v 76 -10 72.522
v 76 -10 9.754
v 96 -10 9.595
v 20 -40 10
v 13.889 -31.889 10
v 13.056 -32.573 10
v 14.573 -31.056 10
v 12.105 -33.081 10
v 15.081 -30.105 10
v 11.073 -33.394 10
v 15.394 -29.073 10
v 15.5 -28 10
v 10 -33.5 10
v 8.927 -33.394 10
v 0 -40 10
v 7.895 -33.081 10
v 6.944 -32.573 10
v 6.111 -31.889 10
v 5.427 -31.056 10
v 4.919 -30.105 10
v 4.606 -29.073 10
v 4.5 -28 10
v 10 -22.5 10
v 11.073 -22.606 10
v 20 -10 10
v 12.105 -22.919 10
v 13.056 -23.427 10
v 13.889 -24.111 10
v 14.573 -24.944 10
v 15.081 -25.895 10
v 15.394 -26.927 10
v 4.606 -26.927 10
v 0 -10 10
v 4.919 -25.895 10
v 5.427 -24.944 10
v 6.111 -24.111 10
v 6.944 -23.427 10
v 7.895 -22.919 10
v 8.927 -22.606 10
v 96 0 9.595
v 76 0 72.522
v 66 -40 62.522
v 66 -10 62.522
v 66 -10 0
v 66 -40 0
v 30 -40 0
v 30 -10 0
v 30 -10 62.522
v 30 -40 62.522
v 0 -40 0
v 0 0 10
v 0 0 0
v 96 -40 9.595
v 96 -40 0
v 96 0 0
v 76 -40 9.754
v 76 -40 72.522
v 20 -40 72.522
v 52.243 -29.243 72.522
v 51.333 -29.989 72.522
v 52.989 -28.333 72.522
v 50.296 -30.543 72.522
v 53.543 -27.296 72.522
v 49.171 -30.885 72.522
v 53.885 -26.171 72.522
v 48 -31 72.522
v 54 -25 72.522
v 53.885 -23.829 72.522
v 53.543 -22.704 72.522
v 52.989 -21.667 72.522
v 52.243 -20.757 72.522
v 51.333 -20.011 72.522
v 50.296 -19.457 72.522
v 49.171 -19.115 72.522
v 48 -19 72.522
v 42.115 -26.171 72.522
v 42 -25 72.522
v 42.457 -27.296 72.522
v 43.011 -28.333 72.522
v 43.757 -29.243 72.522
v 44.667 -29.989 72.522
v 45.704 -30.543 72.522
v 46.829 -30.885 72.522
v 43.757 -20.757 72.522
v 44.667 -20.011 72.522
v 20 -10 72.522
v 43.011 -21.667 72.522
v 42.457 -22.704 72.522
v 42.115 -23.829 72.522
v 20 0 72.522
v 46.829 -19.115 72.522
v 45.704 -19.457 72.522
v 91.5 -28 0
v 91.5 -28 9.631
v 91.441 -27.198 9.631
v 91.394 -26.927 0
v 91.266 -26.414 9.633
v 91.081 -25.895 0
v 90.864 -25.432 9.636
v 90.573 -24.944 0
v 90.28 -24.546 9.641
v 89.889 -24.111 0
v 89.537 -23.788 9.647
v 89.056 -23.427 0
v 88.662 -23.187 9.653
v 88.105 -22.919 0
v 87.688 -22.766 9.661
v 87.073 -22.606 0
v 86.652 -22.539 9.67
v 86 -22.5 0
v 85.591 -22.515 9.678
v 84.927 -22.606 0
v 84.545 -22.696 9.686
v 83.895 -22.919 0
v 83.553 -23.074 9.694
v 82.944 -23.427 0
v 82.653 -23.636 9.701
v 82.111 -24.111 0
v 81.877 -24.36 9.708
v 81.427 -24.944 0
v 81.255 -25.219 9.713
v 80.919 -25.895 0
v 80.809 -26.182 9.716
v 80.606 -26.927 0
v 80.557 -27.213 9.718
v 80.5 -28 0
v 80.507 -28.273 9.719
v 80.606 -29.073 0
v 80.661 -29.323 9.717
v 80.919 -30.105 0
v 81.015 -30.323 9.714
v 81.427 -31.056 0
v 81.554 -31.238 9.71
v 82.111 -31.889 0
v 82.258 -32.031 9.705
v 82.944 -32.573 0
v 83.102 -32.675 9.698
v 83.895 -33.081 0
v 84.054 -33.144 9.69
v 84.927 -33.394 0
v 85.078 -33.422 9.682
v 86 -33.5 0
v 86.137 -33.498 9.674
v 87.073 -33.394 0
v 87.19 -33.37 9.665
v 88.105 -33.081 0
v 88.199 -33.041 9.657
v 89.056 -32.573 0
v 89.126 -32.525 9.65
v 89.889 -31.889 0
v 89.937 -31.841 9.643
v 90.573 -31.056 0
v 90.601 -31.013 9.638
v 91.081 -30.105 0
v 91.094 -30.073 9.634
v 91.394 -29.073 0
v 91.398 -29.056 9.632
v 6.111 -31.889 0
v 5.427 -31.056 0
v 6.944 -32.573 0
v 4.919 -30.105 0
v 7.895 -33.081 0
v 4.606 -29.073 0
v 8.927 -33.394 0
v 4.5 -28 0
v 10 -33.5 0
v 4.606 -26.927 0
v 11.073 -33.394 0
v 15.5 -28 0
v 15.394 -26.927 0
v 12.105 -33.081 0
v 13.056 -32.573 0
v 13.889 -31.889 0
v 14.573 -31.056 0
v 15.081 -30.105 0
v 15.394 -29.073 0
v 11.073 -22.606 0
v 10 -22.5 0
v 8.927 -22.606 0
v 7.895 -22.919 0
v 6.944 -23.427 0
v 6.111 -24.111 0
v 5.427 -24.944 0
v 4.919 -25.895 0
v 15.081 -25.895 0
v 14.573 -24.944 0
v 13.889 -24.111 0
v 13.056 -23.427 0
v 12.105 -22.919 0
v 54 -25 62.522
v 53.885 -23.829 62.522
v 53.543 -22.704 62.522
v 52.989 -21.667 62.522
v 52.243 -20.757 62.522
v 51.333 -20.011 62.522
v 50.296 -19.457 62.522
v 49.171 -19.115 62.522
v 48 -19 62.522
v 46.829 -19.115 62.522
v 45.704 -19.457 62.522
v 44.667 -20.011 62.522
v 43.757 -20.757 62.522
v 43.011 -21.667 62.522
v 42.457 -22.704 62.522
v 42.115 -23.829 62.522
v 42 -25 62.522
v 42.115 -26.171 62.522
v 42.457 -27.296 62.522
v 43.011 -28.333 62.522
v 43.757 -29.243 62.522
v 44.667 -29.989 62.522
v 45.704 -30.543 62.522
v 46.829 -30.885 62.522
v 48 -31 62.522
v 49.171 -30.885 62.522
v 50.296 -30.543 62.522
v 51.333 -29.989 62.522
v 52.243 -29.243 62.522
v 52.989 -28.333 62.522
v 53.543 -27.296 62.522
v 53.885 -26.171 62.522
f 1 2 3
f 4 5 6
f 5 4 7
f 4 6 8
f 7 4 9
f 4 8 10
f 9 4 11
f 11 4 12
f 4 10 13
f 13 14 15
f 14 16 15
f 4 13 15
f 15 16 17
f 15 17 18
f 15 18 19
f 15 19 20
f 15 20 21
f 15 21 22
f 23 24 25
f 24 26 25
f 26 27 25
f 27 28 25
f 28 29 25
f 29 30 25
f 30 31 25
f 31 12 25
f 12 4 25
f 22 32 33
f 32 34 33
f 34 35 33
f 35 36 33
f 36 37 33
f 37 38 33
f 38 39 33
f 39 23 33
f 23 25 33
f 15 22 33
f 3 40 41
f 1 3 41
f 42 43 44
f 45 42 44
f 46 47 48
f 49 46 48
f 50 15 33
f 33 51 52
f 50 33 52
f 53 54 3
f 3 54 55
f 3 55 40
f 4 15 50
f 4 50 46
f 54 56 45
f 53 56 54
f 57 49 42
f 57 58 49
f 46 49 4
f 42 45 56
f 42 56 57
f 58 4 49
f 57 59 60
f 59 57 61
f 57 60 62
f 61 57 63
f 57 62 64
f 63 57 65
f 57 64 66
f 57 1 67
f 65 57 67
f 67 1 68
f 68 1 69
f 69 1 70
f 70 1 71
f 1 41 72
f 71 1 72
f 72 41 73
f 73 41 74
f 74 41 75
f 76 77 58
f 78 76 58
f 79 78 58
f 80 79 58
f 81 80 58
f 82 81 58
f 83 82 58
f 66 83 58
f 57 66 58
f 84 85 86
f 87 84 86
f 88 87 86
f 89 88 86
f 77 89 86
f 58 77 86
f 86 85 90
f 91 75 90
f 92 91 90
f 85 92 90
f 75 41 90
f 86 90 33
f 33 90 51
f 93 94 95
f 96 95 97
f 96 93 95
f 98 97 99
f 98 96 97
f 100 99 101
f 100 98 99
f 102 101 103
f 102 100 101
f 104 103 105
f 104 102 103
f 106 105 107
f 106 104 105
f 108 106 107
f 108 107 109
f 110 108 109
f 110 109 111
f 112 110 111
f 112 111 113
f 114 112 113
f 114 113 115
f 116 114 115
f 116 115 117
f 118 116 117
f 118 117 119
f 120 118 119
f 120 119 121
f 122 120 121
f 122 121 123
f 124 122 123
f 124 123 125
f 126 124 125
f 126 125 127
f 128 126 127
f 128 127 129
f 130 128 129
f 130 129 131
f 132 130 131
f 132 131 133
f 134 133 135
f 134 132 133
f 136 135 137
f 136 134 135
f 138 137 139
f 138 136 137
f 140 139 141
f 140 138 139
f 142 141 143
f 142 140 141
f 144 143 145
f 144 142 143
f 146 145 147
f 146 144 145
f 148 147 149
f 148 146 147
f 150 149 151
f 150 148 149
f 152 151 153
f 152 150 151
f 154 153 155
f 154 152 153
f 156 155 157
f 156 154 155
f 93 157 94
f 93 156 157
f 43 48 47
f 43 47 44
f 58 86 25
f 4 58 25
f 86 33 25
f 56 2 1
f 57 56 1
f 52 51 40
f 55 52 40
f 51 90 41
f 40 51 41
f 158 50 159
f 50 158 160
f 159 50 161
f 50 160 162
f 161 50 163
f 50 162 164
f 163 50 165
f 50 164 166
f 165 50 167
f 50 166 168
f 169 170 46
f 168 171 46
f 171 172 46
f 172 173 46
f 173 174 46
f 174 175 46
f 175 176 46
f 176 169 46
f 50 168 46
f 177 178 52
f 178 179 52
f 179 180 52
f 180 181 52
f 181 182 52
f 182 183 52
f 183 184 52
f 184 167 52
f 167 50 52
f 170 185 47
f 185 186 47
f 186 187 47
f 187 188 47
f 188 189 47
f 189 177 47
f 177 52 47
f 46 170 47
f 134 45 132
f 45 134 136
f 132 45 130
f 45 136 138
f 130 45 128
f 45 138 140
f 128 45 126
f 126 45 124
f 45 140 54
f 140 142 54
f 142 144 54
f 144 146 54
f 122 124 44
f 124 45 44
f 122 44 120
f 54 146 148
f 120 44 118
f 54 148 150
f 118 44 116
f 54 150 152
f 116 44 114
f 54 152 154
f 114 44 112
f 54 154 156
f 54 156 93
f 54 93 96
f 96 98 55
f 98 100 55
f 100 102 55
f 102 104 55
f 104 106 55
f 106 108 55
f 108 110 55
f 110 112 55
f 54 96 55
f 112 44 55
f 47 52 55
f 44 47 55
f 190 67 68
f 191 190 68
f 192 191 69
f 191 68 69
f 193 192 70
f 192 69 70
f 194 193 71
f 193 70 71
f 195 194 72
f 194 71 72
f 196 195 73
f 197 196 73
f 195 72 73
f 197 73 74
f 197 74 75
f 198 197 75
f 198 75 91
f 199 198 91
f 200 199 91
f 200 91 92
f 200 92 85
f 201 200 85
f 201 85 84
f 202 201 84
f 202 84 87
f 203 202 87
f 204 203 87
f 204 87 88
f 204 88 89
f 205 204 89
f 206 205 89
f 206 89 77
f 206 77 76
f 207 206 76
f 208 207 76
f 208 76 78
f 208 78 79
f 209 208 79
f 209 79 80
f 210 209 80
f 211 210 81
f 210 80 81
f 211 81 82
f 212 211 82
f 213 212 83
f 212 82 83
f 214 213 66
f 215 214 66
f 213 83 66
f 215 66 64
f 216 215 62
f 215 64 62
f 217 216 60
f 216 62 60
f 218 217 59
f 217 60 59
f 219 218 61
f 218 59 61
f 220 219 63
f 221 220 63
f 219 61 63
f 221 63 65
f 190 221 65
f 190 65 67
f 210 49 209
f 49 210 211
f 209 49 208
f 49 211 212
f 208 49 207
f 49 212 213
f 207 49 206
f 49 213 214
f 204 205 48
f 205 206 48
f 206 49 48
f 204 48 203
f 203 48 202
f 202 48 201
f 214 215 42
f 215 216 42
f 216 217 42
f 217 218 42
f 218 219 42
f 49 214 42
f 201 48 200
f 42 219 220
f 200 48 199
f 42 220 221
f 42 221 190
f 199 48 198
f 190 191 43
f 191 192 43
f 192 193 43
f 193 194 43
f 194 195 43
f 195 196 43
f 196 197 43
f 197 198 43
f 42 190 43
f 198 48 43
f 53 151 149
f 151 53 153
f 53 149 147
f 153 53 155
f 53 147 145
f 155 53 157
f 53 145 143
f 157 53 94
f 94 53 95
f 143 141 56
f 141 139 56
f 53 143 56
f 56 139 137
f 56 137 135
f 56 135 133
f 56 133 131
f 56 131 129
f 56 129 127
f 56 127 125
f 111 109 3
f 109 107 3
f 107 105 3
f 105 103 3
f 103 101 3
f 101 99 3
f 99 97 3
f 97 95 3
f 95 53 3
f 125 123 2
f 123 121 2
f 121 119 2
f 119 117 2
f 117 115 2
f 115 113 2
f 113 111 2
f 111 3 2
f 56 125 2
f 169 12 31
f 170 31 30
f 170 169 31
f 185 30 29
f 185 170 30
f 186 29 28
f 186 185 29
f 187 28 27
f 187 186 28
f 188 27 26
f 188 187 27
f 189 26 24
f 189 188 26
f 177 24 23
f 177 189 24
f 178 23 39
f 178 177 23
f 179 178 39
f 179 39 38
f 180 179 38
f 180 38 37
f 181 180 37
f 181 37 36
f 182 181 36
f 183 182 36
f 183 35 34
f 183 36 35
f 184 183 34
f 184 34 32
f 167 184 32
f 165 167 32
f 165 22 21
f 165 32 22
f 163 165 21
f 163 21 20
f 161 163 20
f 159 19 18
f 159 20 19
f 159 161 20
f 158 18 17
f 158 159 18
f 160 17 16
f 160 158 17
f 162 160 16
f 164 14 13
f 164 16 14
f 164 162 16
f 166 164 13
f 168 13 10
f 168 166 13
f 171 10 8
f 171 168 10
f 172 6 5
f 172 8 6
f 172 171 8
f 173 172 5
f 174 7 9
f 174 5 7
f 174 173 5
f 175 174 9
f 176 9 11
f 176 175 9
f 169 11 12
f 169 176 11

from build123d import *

# Parameters (mm, degrees)
F1_DEPTH = 10
F0_W     = 36
F0_H     = 62.5223250638
F2_DEPTH = 40
F3_R     = 5.5
F4_DEPTH = 25
F5_R     = 6
F6_DEPTH = 25


with BuildPart() as f1:
    # F0 (on Front) → F1 (new body)
    with BuildSketch(Plane.XZ):
        Polygon((20, 72.5223250638), (0, 10), (20, 10), align=None)
    extrude(amount=F1_DEPTH)



with BuildPart() as f1b:
    # F0 (on Front) → F1, piece 2 (new body)
    with BuildSketch(Plane.XZ):
        with Locations((48, 31.2611625319)):
            Rectangle(F0_W, F0_H)
    extrude(amount=F1_DEPTH)


with BuildPart() as f1c:
    # F0 (on Front) → F1, piece 3 (new body)
    with BuildSketch(Plane.XZ):
        Polygon((96, 9.5949610695), (76, 72.5223250638), (76, 9.7544647339), align=None)
    extrude(amount=F1_DEPTH)


with BuildPart() as f1_1:
    add(f1.part)

    add(f1b.part)  # F2 merges F1b

    add(f1c.part)  # F2 merges F1c
    # F0 (on Front) → F2 (join)
    with BuildSketch(Plane.XZ):
        Polygon((0, 10), (0, 0), (30, 0), (30, 62.5223250638), (66, 62.5223250638), (66, 0), (96, 0), (96, 9.5949610695), (76, 9.7544647339), (76, 72.5223250638), (20, 72.5223250638), (20, 10), align=None)
    extrude(amount=F2_DEPTH)

    # F3 (on Top) → F4 (cut)
    with BuildSketch(Plane.XY):
        with Locations((10, -28)):
            Circle(F3_R)
        with Locations((86, -28)):
            Circle(F3_R)
    extrude(amount=F4_DEPTH, mode=Mode.SUBTRACT)

    # F5 (on face) → F6 (cut)
    with BuildSketch(Plane.XY.offset(72.5223250638)):
        with Locations((48, -25)):
            Circle(F5_R)
    extrude(amount=-F6_DEPTH, mode=Mode.SUBTRACT)


solid = f1_1.part
